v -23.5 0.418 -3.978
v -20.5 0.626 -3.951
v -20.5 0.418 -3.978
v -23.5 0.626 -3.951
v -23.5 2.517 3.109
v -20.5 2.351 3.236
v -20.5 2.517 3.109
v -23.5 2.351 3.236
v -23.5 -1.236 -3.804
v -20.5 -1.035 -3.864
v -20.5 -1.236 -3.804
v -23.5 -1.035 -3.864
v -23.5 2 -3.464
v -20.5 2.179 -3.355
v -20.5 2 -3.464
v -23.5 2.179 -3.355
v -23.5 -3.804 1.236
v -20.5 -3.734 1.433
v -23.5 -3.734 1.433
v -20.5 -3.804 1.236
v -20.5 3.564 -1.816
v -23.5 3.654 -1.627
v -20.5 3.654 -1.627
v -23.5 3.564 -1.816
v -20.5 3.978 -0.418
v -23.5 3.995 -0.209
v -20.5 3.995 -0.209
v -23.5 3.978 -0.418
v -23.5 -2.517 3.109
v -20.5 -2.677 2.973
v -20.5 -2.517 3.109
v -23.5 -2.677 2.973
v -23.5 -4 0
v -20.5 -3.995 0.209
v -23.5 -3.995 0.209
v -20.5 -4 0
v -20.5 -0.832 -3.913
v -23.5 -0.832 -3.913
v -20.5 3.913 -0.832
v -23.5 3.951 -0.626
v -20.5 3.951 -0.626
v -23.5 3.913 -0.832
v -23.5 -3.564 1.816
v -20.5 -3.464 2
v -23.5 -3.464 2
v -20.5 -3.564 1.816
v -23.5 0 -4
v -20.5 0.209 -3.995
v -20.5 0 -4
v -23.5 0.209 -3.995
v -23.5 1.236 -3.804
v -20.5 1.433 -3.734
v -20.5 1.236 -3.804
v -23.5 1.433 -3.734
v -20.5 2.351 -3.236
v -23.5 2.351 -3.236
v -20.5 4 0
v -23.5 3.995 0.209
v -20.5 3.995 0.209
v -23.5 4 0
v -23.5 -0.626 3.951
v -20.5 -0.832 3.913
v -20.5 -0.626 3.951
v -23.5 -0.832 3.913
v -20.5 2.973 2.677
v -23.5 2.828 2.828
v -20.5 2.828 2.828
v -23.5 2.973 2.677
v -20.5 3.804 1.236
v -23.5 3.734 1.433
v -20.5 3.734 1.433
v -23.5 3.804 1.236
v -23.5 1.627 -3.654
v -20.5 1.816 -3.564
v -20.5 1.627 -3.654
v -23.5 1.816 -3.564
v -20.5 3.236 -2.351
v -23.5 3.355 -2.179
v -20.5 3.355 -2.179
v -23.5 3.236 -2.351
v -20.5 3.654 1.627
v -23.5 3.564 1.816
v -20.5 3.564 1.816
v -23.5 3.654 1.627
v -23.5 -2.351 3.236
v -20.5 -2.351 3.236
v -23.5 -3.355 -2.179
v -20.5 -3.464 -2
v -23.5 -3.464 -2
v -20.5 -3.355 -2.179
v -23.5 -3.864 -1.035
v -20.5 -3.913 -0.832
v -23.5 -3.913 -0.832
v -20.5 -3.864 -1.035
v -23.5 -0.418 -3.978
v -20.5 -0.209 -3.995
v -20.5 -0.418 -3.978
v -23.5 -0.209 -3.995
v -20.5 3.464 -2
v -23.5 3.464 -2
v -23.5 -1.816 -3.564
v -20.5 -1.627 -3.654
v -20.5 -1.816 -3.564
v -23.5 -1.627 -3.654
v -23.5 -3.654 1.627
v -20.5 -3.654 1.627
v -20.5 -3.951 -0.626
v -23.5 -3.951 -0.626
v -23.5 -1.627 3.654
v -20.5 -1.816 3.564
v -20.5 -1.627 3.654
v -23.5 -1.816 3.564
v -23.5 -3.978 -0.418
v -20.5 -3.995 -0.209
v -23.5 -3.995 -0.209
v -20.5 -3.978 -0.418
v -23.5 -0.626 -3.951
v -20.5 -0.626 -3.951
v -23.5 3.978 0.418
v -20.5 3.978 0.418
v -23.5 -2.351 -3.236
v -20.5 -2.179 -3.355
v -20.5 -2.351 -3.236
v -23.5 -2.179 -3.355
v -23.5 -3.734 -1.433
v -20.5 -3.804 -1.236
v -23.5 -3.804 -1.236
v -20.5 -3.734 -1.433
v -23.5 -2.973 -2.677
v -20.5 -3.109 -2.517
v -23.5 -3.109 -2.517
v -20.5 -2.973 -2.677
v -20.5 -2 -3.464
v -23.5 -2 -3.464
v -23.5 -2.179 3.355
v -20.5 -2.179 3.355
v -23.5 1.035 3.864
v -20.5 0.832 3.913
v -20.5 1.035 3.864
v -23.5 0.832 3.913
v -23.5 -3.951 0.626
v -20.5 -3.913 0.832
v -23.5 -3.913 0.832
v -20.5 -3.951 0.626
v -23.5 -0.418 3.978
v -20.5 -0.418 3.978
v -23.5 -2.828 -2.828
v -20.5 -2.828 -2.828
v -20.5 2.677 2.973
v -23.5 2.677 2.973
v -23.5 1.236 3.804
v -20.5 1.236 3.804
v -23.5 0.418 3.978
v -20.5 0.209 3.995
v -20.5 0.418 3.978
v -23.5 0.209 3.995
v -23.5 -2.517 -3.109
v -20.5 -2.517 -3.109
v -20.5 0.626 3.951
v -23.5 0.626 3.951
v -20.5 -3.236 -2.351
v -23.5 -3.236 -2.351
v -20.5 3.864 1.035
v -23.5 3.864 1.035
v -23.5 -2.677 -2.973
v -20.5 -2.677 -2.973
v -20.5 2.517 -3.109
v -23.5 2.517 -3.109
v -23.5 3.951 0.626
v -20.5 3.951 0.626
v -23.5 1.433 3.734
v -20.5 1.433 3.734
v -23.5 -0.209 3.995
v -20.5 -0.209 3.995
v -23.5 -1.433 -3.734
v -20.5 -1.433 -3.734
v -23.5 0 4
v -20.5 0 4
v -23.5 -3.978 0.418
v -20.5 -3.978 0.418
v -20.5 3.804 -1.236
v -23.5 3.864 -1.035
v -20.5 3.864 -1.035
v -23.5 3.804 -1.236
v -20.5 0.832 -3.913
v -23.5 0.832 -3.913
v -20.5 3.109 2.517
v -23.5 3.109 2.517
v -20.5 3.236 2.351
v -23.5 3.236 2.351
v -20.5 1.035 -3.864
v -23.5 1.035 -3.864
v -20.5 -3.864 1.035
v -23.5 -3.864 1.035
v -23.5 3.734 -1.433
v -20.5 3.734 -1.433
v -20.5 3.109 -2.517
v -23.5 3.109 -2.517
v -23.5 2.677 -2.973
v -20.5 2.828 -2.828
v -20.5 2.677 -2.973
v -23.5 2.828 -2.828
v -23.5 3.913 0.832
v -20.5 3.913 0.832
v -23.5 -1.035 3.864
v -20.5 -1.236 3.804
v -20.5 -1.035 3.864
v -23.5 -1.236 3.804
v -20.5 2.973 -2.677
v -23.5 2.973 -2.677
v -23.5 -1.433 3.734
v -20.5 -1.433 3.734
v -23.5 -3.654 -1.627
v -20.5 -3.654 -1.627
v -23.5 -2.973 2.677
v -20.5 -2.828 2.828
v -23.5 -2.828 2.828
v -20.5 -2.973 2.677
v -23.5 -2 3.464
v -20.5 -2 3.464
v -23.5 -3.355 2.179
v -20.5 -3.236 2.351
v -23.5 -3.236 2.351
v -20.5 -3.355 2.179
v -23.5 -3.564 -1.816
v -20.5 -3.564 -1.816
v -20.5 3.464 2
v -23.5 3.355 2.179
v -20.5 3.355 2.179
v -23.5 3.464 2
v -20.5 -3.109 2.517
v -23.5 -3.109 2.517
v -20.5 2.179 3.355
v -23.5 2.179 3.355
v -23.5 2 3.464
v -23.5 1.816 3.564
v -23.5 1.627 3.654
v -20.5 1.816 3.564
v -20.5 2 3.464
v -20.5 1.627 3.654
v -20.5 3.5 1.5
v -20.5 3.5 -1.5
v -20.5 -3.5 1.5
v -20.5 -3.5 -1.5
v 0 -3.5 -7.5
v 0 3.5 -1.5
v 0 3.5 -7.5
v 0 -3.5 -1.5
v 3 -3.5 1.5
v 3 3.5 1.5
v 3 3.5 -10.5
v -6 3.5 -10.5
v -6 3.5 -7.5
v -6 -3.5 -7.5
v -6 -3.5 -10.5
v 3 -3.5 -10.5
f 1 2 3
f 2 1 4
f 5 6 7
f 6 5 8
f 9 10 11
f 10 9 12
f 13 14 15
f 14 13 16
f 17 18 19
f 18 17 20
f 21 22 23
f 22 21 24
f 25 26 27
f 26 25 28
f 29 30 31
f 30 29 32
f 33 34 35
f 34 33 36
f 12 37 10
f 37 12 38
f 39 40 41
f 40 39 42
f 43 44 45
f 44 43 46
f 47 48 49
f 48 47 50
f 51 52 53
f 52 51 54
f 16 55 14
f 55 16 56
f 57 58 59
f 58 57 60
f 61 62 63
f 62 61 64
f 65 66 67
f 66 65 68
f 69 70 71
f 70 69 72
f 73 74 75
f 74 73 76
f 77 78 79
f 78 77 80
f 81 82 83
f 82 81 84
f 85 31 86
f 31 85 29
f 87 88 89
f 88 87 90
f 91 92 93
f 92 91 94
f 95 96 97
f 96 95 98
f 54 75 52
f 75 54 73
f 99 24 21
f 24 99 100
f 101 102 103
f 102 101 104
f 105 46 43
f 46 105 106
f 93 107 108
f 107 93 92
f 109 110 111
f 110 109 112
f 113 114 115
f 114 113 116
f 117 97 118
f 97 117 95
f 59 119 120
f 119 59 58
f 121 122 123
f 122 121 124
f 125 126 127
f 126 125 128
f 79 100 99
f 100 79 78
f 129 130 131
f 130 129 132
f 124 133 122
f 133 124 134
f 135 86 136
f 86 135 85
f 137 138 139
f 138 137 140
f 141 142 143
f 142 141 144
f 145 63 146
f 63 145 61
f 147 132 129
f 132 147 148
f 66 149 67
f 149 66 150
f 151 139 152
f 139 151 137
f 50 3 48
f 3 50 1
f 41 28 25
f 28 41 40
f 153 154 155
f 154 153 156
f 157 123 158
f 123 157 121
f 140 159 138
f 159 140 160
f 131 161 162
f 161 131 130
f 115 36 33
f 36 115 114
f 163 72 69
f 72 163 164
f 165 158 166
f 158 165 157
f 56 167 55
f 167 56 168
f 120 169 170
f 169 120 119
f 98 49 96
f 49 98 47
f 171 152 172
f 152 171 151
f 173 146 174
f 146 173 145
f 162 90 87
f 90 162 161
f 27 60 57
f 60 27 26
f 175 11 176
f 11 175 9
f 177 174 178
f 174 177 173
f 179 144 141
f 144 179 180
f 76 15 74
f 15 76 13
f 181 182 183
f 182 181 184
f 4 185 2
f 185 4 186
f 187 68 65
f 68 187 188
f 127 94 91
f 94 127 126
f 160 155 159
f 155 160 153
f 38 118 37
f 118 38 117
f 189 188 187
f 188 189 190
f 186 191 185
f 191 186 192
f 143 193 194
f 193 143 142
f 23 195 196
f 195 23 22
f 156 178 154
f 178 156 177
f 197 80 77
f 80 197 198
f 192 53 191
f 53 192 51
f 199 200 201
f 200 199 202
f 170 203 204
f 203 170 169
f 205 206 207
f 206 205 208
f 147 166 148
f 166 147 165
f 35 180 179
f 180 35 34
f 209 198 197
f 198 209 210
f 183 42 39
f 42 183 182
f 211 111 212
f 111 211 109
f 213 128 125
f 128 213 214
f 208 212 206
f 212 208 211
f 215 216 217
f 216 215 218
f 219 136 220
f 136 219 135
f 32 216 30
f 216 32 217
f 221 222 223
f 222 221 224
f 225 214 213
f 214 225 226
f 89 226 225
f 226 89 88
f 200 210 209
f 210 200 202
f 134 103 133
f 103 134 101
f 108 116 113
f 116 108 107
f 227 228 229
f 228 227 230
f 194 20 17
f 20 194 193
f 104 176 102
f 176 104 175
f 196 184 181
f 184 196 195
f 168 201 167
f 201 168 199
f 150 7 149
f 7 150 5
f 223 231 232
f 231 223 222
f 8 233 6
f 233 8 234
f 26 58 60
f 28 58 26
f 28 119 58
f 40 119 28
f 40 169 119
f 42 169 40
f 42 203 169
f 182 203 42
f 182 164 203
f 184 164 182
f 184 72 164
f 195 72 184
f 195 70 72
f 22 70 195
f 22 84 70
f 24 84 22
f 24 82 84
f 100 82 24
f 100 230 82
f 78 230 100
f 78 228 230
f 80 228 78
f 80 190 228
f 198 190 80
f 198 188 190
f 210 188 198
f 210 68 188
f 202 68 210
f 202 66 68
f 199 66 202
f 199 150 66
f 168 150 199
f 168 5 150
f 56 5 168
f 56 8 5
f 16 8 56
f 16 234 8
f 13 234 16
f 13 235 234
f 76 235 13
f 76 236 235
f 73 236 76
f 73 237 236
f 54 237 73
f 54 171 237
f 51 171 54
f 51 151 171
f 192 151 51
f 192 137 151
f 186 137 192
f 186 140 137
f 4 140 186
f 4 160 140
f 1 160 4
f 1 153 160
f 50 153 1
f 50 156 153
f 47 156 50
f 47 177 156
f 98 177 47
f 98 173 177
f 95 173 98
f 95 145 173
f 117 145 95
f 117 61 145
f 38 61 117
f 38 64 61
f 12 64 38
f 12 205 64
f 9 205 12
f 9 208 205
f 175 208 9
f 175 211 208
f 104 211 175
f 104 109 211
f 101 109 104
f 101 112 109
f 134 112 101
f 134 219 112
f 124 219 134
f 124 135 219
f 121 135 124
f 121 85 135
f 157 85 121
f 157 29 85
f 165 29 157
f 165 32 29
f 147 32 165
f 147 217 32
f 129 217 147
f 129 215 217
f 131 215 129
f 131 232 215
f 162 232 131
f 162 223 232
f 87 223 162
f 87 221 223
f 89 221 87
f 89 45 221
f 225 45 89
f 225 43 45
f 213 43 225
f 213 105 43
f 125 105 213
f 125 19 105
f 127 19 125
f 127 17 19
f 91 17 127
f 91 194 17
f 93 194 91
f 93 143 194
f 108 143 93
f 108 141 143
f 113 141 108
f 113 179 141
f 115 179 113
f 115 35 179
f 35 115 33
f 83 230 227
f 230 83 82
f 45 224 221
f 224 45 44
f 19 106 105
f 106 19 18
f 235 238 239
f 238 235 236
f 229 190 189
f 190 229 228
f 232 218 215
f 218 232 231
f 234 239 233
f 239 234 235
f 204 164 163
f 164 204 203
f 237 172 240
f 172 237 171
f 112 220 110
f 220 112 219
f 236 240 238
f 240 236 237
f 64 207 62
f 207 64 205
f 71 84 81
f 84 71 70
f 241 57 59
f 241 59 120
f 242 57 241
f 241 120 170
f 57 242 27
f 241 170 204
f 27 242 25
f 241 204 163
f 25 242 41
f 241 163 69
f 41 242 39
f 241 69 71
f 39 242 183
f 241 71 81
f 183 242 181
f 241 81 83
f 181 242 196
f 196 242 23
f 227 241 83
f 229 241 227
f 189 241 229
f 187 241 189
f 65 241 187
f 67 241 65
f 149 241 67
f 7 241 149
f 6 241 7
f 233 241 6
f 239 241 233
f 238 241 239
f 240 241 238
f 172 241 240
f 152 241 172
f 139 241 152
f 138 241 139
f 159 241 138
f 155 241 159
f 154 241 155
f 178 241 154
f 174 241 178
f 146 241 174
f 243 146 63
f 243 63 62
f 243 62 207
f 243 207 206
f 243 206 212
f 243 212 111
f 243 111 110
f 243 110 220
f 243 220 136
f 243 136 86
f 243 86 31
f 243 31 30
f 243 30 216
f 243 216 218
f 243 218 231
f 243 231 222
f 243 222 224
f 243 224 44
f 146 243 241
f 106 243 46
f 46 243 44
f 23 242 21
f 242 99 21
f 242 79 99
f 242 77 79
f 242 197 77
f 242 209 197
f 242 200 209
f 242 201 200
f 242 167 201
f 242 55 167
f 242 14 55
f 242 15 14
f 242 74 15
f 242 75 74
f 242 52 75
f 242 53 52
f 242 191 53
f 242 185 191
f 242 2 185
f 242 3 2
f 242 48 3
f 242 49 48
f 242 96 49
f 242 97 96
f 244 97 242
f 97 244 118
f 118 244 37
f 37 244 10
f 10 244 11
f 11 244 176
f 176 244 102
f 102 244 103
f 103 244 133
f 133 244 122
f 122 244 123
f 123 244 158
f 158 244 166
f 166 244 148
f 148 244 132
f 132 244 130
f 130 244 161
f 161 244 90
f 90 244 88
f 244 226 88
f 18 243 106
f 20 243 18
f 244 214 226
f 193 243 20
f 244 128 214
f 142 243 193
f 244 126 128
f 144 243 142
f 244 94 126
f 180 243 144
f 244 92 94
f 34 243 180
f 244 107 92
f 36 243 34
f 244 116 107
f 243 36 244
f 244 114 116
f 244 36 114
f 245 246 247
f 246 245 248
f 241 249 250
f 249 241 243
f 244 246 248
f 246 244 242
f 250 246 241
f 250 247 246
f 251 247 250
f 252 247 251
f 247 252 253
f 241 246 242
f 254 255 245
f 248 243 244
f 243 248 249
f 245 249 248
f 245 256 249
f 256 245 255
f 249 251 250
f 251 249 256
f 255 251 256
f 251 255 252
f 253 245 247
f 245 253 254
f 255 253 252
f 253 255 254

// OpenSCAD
$fn = 120;
p_len = 22; 
h_cyl = 3;


translate([-p_len, 0, 0]){
    rotate([0, 90, 0]){
        cylinder(h = h_cyl, r = 4, center = true);
    }
    translate([0, -3.5, -1.5]){
        cube([p_len, 7, 3]);
    }
}
translate([0, -3.5, -10.5]){
cube([3, 7, 12]);
}
translate([-6, -3.5, -10.5]){
cube([6, 7, 3]);
}
